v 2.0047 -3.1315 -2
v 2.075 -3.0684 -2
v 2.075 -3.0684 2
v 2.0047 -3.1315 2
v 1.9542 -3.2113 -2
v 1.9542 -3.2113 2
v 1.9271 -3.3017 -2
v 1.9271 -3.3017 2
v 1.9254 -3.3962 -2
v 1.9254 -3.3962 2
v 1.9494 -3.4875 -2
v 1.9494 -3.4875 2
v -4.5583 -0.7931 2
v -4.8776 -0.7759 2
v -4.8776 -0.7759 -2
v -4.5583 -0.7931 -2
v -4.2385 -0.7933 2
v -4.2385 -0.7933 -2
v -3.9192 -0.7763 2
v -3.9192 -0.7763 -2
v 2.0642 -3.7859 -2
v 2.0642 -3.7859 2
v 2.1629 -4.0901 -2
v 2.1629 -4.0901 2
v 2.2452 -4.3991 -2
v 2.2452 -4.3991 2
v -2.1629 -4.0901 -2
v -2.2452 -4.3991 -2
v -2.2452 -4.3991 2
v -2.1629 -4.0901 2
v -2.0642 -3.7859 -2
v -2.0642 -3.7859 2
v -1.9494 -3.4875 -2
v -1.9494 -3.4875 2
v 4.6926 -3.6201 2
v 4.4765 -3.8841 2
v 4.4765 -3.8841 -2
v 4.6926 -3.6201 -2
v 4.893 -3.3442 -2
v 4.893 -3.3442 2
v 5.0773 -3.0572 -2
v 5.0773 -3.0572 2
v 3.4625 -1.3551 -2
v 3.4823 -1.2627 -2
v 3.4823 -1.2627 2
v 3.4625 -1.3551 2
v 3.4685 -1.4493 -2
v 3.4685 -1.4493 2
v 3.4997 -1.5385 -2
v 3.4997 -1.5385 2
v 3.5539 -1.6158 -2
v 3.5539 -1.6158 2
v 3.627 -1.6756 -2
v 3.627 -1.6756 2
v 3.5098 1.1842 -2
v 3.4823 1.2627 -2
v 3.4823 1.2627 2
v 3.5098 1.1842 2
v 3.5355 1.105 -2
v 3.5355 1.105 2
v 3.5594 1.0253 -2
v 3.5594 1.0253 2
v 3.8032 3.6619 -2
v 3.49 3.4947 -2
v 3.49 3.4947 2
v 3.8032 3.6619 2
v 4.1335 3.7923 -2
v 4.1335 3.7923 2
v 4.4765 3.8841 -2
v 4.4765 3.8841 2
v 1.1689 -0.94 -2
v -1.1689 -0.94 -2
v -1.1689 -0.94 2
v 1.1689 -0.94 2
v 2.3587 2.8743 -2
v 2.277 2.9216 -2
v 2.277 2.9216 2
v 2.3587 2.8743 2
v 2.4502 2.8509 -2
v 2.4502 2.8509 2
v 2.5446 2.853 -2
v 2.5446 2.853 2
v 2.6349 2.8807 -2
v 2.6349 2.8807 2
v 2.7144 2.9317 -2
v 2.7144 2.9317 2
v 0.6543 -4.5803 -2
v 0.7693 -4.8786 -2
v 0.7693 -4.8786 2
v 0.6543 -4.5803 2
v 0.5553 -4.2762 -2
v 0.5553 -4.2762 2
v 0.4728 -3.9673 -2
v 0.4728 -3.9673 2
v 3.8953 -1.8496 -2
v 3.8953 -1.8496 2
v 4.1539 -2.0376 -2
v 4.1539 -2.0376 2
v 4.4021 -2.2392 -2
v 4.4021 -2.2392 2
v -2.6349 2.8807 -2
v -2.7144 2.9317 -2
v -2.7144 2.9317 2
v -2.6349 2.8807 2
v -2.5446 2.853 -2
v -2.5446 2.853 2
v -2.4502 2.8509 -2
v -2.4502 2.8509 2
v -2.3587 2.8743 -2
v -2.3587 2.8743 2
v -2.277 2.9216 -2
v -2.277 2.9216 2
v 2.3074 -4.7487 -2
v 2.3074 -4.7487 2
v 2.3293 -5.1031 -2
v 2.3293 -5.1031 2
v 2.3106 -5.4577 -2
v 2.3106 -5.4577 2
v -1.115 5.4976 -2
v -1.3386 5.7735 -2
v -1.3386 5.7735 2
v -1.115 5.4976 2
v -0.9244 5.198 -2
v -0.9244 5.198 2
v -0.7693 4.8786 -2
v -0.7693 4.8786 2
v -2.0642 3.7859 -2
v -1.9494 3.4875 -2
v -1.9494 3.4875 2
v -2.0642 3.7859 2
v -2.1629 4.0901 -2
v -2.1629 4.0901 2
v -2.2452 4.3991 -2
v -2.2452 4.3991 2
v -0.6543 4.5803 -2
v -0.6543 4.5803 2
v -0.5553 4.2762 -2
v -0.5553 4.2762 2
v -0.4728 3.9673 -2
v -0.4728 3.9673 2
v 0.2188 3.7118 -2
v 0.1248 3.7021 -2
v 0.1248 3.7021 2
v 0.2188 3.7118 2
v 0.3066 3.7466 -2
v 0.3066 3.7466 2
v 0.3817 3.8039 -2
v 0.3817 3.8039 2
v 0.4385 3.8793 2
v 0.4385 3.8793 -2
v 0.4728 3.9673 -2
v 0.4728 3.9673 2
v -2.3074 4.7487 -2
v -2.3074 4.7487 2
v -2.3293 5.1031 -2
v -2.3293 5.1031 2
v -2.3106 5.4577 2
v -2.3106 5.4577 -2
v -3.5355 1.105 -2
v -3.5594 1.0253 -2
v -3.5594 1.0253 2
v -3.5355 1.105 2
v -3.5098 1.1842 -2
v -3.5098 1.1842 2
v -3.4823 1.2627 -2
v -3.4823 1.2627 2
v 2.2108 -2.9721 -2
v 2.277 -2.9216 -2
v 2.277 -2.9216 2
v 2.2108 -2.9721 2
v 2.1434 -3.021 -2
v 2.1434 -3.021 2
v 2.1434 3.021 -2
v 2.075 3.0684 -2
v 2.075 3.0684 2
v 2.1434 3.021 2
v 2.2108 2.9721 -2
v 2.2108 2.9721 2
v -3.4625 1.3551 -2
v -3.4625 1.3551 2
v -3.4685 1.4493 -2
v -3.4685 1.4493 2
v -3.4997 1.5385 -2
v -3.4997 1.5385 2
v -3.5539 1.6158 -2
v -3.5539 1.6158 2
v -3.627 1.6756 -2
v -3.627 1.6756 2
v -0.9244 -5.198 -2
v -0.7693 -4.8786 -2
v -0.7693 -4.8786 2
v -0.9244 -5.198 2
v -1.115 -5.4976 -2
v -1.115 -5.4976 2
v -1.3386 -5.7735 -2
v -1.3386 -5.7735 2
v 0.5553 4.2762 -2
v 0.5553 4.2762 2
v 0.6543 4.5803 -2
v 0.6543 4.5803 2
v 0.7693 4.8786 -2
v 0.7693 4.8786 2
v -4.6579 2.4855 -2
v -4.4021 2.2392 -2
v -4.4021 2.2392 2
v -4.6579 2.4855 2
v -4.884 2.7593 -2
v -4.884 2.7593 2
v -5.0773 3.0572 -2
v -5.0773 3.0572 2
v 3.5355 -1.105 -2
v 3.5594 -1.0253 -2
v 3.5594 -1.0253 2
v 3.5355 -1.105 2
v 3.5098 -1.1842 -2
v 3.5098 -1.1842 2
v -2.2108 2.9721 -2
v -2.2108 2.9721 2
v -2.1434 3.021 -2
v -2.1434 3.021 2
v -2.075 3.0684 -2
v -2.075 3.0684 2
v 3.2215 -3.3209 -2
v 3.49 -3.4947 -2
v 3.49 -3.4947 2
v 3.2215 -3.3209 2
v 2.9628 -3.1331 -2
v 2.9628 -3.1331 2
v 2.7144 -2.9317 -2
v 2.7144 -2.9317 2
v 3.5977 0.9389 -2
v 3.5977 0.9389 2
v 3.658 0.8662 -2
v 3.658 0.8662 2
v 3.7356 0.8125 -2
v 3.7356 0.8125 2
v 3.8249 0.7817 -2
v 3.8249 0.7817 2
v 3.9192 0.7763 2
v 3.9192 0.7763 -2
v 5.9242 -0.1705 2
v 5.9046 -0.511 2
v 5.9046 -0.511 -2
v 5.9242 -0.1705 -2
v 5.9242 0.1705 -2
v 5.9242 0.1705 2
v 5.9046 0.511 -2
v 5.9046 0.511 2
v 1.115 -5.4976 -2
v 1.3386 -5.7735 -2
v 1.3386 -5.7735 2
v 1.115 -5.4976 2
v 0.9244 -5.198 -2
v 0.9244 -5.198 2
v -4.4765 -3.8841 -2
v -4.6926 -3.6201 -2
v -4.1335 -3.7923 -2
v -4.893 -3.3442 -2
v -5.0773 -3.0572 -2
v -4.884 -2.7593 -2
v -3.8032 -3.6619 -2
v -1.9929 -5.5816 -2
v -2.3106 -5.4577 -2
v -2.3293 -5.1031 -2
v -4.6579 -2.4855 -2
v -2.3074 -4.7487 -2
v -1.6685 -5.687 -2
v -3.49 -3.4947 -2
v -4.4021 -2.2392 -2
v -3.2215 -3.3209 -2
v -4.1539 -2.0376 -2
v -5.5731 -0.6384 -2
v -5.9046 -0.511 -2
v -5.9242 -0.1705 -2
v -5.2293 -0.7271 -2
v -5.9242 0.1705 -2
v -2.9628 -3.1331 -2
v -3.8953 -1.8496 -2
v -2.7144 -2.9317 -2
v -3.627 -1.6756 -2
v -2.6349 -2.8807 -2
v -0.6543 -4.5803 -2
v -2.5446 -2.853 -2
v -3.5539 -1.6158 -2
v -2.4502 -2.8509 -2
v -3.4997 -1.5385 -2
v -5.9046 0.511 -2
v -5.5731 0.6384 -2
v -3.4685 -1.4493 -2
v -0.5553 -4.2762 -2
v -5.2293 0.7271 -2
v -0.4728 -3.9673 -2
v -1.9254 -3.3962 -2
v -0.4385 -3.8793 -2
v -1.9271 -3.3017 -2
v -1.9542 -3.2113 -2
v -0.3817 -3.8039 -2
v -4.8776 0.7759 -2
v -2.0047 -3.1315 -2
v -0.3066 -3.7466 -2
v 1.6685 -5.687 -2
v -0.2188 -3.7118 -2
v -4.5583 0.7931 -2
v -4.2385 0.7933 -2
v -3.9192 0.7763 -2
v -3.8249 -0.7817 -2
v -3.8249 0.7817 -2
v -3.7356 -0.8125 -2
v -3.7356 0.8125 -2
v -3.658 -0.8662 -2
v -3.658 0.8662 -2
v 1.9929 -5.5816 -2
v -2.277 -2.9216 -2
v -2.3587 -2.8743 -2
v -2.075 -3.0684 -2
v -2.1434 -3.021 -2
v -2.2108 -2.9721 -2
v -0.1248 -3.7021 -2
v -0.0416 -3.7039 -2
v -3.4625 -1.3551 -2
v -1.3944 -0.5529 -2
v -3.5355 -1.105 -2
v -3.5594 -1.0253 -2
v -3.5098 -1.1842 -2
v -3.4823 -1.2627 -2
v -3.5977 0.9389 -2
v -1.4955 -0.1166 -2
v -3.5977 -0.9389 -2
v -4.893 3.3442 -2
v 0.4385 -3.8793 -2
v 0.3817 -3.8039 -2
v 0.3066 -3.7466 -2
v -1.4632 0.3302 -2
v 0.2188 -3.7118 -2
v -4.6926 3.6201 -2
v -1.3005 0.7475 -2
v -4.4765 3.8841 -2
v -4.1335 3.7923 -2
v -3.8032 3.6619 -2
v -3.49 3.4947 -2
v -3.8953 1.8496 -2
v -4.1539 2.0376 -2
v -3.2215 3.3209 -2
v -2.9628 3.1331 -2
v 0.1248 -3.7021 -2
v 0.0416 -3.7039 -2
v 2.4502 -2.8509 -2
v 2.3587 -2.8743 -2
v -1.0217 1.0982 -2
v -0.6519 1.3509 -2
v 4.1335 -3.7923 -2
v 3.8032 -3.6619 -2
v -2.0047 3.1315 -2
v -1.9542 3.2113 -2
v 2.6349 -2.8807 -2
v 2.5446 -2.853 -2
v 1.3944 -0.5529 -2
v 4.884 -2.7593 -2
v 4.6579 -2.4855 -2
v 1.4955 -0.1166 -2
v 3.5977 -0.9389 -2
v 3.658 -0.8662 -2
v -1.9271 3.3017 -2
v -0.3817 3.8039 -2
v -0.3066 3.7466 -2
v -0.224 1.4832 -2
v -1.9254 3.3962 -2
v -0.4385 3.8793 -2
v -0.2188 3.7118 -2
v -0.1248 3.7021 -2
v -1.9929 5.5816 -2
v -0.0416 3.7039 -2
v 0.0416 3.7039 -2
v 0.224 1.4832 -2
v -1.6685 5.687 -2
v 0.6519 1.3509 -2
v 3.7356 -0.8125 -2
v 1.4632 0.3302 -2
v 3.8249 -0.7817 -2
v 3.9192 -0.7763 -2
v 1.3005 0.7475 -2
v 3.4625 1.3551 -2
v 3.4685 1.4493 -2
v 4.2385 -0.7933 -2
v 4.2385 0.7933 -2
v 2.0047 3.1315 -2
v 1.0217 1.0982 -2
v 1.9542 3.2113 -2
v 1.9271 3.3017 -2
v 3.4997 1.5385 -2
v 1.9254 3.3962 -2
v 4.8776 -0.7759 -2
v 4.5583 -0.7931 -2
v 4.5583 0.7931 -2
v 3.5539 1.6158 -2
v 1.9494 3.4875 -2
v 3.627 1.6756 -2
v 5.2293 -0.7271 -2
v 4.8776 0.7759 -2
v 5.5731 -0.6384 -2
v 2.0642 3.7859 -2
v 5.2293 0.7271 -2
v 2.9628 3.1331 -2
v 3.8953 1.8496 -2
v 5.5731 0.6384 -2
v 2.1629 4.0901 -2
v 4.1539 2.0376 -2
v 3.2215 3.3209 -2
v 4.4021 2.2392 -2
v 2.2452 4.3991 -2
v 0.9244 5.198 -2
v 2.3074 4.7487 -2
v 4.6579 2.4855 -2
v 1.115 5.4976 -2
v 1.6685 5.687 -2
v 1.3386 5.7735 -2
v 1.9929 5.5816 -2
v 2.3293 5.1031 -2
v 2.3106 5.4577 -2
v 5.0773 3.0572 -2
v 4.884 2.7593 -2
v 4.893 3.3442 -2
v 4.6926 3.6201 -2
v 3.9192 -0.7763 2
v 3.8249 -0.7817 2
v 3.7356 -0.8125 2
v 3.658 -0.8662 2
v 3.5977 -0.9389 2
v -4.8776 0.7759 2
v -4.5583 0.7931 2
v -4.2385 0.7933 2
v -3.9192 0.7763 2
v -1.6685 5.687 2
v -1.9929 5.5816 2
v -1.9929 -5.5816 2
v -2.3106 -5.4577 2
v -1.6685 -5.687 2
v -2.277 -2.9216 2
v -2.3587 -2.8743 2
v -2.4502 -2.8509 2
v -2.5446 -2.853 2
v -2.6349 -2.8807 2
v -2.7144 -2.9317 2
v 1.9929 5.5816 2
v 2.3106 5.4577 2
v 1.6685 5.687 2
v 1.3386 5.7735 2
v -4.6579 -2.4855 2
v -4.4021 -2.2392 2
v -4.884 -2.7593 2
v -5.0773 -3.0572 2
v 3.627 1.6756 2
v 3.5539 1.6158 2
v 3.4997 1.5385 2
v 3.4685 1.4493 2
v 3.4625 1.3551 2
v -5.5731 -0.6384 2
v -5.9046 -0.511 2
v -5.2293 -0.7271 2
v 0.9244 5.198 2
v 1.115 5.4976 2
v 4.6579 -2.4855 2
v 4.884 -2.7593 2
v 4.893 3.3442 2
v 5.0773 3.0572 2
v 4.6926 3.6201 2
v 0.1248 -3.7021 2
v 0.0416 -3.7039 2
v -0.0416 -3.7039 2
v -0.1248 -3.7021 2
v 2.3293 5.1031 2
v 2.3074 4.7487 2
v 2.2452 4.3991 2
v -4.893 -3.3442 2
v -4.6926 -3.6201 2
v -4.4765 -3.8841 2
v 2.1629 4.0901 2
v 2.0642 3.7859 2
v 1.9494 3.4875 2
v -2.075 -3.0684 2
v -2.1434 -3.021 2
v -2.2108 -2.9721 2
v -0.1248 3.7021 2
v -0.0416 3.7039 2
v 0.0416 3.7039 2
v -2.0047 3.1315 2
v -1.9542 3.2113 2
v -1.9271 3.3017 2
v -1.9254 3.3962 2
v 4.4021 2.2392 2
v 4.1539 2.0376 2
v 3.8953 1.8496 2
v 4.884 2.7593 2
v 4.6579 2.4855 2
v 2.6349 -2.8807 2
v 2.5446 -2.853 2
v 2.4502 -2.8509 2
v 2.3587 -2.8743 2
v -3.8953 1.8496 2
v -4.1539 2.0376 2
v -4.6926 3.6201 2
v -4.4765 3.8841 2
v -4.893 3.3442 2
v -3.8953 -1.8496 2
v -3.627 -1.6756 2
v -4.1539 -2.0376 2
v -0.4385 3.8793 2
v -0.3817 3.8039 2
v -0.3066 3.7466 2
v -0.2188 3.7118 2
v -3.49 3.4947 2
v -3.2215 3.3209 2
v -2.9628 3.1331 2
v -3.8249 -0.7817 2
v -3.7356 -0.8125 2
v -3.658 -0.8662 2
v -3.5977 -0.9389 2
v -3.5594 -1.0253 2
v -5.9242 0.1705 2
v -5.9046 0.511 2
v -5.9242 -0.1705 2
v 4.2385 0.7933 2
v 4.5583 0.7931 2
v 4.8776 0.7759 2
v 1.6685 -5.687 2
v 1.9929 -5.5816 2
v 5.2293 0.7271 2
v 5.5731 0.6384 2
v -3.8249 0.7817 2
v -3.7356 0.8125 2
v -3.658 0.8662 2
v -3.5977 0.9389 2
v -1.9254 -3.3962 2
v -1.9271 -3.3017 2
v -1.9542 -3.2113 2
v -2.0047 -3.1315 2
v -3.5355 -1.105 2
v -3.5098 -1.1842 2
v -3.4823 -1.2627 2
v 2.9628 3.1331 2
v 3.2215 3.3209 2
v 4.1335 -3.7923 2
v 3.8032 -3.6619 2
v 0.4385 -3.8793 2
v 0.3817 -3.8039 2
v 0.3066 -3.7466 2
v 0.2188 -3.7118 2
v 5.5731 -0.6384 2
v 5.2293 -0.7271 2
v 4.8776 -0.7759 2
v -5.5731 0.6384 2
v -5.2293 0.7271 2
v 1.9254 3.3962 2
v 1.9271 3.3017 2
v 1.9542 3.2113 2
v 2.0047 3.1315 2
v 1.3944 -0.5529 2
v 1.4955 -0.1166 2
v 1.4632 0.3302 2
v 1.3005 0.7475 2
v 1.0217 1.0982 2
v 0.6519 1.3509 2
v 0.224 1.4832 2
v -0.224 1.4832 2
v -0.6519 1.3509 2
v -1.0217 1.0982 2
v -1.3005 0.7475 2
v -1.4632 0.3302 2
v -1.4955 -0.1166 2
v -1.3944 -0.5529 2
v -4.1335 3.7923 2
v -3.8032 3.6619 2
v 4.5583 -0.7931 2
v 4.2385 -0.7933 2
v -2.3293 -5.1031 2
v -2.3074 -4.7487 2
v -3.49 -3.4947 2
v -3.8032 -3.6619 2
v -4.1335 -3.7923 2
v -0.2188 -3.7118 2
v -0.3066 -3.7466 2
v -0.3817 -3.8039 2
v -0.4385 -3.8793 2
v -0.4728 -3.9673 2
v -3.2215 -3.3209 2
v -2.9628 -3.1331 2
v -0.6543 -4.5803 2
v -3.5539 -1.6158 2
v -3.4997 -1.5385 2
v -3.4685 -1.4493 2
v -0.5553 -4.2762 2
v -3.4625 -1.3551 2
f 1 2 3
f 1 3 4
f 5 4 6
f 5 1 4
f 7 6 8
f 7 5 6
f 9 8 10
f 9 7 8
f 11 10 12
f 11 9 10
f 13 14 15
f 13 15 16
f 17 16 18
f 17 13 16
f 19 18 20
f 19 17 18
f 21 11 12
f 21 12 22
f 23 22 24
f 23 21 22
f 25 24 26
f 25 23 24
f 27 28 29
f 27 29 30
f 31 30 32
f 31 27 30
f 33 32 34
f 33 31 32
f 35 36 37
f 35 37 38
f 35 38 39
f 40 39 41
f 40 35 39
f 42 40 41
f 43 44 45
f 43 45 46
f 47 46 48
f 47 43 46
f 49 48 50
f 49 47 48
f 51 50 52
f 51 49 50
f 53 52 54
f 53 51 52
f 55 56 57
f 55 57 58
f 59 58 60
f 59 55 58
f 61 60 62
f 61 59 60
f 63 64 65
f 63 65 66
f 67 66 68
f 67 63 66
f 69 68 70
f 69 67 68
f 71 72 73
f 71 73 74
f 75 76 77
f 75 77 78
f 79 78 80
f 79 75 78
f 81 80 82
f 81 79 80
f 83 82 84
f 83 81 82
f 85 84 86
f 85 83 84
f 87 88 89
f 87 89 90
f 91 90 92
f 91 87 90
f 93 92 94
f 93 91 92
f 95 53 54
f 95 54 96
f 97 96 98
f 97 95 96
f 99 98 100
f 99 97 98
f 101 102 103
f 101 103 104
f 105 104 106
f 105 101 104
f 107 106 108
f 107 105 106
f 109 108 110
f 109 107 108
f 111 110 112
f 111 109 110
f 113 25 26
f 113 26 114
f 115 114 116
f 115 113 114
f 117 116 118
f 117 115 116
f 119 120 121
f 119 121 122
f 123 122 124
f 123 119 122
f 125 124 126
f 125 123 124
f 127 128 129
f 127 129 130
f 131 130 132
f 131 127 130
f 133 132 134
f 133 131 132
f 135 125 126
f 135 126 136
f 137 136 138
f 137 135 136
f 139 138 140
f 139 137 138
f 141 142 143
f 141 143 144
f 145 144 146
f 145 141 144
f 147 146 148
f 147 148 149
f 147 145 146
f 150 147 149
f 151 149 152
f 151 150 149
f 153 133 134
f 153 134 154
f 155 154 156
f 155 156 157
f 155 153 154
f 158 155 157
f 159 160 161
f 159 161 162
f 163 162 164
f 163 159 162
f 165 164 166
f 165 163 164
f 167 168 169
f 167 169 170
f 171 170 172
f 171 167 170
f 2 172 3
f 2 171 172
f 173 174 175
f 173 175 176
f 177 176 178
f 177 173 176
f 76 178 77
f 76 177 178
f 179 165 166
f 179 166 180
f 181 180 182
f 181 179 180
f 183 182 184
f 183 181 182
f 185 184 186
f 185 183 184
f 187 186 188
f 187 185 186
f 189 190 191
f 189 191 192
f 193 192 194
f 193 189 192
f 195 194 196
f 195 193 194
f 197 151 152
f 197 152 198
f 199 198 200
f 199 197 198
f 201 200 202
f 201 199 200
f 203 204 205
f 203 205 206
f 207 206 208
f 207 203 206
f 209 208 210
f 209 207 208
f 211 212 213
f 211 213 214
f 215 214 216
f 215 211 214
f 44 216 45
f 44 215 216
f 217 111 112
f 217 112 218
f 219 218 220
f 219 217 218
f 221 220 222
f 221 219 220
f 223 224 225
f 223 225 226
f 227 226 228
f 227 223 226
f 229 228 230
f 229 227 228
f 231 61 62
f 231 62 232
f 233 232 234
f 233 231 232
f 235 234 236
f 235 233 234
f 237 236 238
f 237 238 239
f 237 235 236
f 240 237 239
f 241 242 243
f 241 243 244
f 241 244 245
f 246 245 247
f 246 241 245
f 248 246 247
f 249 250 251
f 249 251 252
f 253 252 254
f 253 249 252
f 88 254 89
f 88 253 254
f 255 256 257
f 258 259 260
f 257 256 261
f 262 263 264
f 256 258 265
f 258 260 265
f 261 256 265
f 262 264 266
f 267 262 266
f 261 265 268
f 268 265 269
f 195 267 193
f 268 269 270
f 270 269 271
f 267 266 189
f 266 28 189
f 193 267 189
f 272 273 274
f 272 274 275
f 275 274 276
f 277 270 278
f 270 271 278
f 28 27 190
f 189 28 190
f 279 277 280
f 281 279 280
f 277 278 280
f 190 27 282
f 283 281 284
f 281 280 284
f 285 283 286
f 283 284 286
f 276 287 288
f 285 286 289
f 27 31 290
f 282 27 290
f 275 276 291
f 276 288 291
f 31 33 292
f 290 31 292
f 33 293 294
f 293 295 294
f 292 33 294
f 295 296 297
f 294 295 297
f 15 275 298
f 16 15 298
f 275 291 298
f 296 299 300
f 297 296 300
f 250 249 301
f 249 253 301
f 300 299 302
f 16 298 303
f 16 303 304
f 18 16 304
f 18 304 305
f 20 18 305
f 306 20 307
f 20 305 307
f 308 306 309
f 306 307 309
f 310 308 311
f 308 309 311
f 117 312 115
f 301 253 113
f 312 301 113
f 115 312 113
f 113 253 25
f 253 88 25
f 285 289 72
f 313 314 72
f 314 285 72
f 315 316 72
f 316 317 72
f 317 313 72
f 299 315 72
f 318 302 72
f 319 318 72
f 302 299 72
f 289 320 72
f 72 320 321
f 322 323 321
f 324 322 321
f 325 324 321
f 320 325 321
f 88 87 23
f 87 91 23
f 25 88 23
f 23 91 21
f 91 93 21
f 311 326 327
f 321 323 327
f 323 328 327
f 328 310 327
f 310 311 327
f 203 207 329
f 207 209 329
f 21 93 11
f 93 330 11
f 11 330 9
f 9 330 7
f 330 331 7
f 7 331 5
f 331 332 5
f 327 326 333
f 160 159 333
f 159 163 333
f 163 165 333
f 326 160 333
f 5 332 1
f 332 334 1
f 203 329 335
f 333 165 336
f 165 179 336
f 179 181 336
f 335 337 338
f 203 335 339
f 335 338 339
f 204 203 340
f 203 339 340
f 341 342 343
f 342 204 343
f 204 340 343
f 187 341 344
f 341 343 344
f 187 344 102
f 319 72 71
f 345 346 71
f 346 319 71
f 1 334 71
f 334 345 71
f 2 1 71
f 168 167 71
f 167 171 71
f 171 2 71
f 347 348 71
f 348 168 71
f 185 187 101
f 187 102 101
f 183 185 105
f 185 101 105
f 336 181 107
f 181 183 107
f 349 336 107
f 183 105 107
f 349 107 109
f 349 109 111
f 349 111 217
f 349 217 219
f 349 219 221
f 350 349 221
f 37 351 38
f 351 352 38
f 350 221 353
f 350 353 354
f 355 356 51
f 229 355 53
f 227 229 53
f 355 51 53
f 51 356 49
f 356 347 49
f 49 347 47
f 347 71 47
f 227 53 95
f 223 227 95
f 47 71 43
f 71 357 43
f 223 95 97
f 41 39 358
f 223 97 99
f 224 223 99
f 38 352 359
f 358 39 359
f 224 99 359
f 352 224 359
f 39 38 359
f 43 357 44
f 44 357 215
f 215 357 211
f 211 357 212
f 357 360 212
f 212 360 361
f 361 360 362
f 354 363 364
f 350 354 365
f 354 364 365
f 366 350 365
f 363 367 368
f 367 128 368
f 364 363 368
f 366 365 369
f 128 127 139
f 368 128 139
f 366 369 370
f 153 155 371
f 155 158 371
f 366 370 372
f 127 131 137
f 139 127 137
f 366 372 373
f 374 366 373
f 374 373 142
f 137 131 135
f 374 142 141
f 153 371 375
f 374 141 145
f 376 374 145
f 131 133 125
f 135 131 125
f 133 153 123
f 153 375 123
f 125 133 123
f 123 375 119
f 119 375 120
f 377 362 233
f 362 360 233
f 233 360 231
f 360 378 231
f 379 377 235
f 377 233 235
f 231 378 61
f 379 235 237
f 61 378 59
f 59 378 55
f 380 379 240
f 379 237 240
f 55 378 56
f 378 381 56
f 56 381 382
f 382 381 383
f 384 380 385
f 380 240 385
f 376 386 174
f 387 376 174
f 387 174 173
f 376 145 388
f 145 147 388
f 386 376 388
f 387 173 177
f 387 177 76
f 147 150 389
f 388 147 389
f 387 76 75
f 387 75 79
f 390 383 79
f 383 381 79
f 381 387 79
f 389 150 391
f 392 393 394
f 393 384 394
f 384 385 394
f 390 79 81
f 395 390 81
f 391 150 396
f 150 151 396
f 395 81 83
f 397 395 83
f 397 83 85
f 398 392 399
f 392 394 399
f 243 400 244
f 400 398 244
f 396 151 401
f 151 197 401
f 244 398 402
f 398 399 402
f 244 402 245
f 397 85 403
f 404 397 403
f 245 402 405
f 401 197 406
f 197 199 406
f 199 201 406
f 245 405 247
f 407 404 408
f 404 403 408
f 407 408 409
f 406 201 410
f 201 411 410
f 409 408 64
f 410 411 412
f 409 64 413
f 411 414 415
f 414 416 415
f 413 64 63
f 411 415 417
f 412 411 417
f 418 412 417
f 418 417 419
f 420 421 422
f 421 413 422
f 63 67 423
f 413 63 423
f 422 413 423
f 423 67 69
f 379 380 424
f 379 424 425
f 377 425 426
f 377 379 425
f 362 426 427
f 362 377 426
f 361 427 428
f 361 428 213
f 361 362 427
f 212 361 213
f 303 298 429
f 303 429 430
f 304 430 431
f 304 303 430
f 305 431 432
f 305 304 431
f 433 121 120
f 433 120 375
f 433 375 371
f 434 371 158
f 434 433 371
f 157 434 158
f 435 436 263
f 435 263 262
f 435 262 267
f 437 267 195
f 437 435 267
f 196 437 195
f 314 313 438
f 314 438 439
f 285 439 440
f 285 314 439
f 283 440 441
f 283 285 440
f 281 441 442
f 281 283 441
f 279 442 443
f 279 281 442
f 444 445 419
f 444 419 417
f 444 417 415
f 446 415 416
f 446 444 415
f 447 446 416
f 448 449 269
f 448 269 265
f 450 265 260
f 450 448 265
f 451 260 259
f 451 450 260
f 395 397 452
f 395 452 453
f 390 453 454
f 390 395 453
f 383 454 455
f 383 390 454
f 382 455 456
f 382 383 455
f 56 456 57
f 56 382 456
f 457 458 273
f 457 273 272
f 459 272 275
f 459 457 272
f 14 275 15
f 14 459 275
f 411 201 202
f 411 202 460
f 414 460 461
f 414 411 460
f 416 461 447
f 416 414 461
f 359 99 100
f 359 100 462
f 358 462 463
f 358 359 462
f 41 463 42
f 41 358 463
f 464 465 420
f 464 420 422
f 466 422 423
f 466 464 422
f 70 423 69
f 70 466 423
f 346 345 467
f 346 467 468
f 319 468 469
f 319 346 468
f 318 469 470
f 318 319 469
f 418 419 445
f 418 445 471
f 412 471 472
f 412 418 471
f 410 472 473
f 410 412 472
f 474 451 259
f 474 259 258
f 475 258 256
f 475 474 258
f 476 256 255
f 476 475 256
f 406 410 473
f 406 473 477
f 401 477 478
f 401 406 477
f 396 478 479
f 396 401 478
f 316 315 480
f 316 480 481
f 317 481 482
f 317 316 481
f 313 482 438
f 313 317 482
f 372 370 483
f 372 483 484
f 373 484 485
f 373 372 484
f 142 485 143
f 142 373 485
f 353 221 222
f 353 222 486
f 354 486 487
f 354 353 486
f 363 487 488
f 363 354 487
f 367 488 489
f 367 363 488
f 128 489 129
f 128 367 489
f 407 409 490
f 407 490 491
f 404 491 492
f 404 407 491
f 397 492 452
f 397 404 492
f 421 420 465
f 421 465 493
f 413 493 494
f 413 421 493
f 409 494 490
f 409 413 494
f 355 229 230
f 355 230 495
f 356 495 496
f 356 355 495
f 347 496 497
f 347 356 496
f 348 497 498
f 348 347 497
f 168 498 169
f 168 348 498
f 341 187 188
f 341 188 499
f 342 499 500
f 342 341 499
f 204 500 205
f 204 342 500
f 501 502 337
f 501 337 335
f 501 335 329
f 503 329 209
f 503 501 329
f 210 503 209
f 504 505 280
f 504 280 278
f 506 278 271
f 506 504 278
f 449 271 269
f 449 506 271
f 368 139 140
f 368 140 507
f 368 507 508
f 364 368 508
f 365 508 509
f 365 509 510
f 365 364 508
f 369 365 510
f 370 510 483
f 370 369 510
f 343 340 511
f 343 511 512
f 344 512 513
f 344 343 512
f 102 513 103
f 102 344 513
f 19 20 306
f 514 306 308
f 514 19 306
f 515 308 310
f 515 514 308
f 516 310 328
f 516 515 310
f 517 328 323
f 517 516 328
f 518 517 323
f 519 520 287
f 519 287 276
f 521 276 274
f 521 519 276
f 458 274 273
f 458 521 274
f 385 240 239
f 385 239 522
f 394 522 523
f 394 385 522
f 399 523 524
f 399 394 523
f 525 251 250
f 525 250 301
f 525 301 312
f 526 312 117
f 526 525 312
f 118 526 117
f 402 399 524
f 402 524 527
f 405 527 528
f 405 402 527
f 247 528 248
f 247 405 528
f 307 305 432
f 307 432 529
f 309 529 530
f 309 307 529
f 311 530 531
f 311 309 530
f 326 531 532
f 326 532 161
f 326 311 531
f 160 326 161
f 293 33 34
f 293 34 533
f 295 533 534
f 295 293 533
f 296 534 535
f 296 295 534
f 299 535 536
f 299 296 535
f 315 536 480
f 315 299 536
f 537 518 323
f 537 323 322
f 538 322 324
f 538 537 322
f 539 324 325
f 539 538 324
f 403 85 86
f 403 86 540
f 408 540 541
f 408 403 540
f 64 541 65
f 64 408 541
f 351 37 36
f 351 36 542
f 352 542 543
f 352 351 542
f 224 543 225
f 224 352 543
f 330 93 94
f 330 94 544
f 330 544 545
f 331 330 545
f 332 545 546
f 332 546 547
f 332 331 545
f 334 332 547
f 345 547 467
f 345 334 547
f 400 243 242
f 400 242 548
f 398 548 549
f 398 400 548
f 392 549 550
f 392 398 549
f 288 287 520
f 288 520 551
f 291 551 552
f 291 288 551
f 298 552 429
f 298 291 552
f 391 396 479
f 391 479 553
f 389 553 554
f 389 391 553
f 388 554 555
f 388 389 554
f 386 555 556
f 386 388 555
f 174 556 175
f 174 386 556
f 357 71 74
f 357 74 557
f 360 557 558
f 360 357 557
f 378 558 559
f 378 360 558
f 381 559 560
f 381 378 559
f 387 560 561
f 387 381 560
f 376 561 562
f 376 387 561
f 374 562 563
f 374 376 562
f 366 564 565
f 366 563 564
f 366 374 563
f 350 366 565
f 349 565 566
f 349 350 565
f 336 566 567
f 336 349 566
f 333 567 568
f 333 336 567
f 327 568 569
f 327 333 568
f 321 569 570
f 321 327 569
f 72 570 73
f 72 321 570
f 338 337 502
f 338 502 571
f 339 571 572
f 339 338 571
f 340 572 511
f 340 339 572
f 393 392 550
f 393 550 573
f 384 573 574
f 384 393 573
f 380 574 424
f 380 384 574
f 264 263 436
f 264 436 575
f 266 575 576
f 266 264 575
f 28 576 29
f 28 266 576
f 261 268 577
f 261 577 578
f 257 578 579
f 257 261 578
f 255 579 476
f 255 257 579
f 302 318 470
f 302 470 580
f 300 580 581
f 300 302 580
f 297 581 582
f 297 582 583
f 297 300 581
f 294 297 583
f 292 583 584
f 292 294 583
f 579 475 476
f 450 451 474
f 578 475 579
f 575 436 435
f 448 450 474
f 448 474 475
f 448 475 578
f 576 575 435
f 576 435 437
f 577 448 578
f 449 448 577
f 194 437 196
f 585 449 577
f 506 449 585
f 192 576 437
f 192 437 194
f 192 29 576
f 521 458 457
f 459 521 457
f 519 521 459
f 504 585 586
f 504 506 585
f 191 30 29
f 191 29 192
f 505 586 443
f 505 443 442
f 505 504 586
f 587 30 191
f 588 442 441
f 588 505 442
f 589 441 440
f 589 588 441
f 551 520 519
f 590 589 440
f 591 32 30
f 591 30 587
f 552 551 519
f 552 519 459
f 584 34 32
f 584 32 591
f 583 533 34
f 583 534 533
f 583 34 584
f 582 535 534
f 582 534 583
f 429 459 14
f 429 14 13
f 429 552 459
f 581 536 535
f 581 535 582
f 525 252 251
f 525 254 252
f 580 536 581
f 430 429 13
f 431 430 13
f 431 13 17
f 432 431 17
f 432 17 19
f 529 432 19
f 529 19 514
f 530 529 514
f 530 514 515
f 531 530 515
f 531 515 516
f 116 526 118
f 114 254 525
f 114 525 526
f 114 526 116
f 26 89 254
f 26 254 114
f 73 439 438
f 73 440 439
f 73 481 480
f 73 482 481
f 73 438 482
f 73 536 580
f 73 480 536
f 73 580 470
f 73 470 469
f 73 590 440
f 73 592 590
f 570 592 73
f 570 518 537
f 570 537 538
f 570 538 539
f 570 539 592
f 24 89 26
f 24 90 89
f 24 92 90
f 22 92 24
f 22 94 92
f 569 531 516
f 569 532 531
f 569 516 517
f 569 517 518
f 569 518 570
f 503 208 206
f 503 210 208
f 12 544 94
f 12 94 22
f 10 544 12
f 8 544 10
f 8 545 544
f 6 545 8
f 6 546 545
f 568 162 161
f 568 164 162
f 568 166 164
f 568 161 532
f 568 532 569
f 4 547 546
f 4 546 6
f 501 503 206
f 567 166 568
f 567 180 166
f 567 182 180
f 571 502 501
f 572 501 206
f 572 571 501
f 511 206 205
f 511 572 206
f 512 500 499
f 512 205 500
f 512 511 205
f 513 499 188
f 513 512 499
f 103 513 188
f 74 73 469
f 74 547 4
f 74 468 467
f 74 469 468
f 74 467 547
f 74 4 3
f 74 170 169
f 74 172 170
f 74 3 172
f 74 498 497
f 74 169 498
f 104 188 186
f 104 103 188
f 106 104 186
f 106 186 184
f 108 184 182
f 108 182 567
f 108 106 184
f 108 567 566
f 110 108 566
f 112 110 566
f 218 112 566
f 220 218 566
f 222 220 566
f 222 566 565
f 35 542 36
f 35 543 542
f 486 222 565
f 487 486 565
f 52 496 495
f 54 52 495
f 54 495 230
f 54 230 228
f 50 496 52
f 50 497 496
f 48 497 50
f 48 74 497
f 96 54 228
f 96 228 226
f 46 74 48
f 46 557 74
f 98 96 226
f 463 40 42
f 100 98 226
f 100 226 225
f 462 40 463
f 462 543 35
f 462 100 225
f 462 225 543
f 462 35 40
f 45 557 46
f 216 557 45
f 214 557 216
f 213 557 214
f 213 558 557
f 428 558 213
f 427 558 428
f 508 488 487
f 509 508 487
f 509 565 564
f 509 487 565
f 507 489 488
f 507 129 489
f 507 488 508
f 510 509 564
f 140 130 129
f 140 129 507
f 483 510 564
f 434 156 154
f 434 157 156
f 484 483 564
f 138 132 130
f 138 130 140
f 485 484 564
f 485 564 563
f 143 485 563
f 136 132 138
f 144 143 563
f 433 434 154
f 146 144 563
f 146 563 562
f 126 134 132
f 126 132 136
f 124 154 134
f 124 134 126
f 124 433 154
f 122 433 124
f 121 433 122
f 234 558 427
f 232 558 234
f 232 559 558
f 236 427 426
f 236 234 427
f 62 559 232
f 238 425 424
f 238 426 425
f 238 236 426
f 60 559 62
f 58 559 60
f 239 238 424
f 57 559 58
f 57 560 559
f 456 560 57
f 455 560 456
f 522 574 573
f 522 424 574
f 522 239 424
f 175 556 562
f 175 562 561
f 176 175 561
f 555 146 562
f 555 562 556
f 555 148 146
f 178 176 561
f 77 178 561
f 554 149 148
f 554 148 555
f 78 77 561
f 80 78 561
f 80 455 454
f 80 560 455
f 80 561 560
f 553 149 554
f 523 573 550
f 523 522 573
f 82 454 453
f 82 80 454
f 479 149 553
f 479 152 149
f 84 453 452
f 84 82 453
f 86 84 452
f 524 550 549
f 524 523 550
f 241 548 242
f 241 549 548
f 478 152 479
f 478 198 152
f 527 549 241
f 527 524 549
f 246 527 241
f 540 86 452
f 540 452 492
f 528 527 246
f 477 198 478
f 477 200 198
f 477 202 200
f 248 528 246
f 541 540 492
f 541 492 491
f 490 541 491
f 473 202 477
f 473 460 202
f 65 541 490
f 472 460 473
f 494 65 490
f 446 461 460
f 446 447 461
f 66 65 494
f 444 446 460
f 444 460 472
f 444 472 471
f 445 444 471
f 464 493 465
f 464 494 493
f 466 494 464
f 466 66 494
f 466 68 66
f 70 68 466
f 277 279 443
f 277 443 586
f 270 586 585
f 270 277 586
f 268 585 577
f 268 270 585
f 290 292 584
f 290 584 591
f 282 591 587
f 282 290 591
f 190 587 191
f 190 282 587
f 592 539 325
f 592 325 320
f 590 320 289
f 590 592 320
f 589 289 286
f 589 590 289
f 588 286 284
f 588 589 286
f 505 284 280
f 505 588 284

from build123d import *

# Parameters (mm, degrees)
SKETCH1_R                = 5.926666667
BLANK_DISK_DEPTH         = 2.000000064
GEAR_TOOTH_CUT_DEPTH     = 10.287128543
GEAR_TEETH_REVOLVE_COUNT = 10
SKETCH4_R                = 0.75
HUB_EXTRUDE_DEPTH        = 0.635
HEX_BORE_CUT_DEPTH       = 10.19015236
HEX_BORE_CUT_DEPTH_BACK  = 10.19015236


with BuildPart() as part:
    # Sketch1 → BLANK DISK (new, symmetric)
    with BuildSketch(Plane.XY):
        Circle(SKETCH1_R)
    extrude(amount=BLANK_DISK_DEPTH, both=True)

    # Sketch2 → GEAR TOOTH CUT (cut, through all)
    with BuildSketch(Plane.XY.offset(2.000000064)):
        with BuildLine():
            ThreePointArc((-5.077291995, -3.057201951), (-5.636594953, -1.83144072), (-5.90459373, -0.511029022))
            ThreePointArc((-5.90459373, -0.511029022), (-5.402476049, -0.687662082), (-4.877561226, -0.775899444))
            ThreePointArc((-4.877561226, -0.775899444), (-4.39839721, -0.795349357), (-3.919215726, -0.776334691))
            ThreePointArc((-3.919215726, -0.776334691), (-3.694949803, -0.83665634), (-3.55944947, -1.025265898))
            ThreePointArc((-3.55944947, -1.025265898), (-3.522871846, -1.14465045), (-3.482291287, -1.26273437))
            ThreePointArc((-3.482291287, -1.26273437), (-3.481051441, -1.494967805), (-3.627030209, -1.675589246))
            ThreePointArc((-3.627030209, -1.675589246), (-4.025872713, -1.941861868), (-4.402092173, -2.239242719))
            ThreePointArc((-4.402092173, -2.239242719), (-4.774892565, -2.619165437), (-5.077291995, -3.057201951))
        make_face()
    gear_tooth_cut = extrude(amount=-GEAR_TOOTH_CUT_DEPTH, mode=Mode.SUBTRACT)

    # GEAR TEETH REVOLVE: GEAR TOOTH CUT ×10 about axis
    gear_teeth_revolve_axis = Axis((0, 0, 50), (0, 0, -1))
    for i in range(1, GEAR_TEETH_REVOLVE_COUNT):
        add(gear_tooth_cut.rotate(gear_teeth_revolve_axis, i * 360 / GEAR_TEETH_REVOLVE_COUNT), mode=Mode.SUBTRACT)

    # Sketch4 → Hub Extrude (add)
    with BuildSketch(Plane.XY.offset(2.000000064)):
        Circle(SKETCH4_R)
    extrude(amount=HUB_EXTRUDE_DEPTH)

    # Sketch3 → HEX BORE CUT (cut, two sides: drawn at the far end of the back side and taken through both)
    with BuildSketch(Plane.XY.offset(2.000000064).offset(-HEX_BORE_CUT_DEPTH_BACK)):
        with BuildLine():
            Line((-1.168931136, -0.94), (1.168931136, -0.94))
            ThreePointArc((1.168931136, -0.94), (0, 1.5), (-1.168931136, -0.94))
        make_face()
    extrude(amount=HEX_BORE_CUT_DEPTH + HEX_BORE_CUT_DEPTH_BACK, mode=Mode.SUBTRACT)


solid = part.part
